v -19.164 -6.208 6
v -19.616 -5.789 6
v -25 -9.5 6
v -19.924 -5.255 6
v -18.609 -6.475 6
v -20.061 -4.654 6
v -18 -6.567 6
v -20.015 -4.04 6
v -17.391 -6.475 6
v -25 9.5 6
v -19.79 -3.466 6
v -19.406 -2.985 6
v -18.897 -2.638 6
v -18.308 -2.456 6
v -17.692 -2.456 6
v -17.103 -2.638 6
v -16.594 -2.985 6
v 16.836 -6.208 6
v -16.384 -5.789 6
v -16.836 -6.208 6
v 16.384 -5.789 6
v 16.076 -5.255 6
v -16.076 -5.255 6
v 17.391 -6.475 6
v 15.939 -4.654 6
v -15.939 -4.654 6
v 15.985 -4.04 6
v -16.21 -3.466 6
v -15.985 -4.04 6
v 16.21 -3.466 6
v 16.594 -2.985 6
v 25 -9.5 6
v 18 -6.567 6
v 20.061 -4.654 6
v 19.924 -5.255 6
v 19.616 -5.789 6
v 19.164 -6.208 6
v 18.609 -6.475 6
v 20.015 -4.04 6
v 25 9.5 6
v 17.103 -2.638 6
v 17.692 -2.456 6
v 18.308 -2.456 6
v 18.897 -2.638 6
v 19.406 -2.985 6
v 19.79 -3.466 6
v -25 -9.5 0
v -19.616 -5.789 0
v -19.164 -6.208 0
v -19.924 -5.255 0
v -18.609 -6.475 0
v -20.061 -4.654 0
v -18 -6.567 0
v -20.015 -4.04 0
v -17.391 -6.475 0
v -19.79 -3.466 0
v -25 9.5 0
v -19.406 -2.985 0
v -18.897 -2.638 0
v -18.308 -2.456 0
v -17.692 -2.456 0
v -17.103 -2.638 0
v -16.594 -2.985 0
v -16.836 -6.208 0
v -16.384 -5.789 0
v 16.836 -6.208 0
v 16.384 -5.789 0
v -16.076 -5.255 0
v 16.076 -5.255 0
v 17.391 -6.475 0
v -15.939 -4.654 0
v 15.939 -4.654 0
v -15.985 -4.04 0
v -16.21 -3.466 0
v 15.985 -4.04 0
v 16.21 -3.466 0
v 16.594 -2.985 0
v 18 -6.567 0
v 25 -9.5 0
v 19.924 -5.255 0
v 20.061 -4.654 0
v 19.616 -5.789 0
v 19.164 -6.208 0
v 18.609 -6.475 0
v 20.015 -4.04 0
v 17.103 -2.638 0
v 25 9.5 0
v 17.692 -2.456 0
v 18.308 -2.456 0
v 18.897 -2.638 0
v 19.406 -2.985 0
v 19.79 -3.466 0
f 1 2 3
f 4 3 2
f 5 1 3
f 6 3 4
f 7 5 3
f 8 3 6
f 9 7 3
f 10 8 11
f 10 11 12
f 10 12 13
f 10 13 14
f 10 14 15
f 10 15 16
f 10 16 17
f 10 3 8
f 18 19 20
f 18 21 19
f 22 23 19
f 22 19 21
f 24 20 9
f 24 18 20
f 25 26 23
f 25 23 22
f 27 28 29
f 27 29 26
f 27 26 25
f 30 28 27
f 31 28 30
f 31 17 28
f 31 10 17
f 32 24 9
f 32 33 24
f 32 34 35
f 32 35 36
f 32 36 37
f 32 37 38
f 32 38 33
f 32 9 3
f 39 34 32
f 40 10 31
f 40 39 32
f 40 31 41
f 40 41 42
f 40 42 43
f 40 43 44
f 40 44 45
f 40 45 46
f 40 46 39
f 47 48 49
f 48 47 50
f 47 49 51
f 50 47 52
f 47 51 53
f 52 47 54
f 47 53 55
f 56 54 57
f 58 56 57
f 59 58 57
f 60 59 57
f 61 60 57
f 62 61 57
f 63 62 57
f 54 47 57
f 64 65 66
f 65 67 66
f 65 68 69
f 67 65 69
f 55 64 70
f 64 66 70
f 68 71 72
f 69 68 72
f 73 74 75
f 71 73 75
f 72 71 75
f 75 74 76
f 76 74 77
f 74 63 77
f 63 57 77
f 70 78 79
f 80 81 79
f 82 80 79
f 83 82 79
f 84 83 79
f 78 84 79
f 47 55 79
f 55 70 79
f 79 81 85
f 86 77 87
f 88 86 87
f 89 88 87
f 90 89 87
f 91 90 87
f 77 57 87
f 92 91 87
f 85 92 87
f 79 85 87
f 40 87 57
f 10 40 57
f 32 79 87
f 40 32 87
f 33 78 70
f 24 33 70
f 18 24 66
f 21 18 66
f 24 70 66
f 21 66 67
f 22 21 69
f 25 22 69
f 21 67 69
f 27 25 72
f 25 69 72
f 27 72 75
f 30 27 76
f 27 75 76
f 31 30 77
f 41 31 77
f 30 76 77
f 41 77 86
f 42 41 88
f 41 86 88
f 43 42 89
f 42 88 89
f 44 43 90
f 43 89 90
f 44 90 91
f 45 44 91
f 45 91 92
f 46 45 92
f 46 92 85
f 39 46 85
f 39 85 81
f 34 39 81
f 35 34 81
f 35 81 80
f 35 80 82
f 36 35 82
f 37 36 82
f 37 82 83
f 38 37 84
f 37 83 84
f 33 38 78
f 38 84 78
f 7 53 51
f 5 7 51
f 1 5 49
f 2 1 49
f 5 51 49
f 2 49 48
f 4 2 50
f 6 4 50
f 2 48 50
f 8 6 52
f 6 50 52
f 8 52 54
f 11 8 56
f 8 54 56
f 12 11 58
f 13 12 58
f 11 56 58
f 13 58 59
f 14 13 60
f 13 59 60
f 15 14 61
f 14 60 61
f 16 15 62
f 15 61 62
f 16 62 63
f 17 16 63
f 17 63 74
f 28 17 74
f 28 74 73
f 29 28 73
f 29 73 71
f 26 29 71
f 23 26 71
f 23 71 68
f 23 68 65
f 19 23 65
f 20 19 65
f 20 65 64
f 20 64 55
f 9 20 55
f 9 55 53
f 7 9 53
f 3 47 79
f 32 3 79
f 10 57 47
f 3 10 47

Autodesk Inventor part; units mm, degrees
ref_plane "YZ Plane" through (0, 0, 0) normal (1, 0, 0) x (0, 1, 0)
ref_plane "XZ Plane" through (0, 0, 0) normal (0, 1, 0) x (-1, 0, 0)
ref_plane "XY Plane" through (0, 0, 0) normal (0, 0, 1) x (1, 0, 0)
sketch "Sketch1" plane through (0, 0, 0) normal (0, 0, 1) x (1, 0, 0)
  line L0 (-25, -9.5) -> (25, -9.5)
  line L1 (25, -9.5) -> (25, 9.5)
  line L2 (25, 9.5) -> (-25, 9.5)
  line L3 (-25, 9.5) -> (-25, -9.5)
  line L4 (-25, -9.5) -> (25, 9.5) construction
  line L5 (25, -9.5) -> (-25, 9.5) construction
  point P0 (0, 0)
  dimension "d0" = 50
  dimension "d1" = 19
extrude "Extrusion1" add sketch "Sketch1" along normal blind 6
sketch "Sketch2" plane through (0, 0, 6) normal (0, 0, 1) x (1, 0, 0)
  line L0 (-25, -9.5) -> (25, -9.5) projected
  line L1 (-25, 9.5) -> (-25, -9.5) projected
  line L2 (25, -9.5) -> (25, 9.5) projected
  point P0 (0, 0)
  point P1 (-18, -4.5)
  point P2 (18, -4.5)
  dimension "d4" = 5
  dimension "d5" = 5
  dimension "d6" = 7
  dimension "d7" = 7
hole "Hole1" at (-18, -4.5, 6) at (18, -4.5, 6) direction (0, 0, -1) diameter 4.134 depth 6 thread size "M5x0.8" class "6H" standard "ISO Metric profile"
properties part number "Funrungesch" material "Steel, Mild"
